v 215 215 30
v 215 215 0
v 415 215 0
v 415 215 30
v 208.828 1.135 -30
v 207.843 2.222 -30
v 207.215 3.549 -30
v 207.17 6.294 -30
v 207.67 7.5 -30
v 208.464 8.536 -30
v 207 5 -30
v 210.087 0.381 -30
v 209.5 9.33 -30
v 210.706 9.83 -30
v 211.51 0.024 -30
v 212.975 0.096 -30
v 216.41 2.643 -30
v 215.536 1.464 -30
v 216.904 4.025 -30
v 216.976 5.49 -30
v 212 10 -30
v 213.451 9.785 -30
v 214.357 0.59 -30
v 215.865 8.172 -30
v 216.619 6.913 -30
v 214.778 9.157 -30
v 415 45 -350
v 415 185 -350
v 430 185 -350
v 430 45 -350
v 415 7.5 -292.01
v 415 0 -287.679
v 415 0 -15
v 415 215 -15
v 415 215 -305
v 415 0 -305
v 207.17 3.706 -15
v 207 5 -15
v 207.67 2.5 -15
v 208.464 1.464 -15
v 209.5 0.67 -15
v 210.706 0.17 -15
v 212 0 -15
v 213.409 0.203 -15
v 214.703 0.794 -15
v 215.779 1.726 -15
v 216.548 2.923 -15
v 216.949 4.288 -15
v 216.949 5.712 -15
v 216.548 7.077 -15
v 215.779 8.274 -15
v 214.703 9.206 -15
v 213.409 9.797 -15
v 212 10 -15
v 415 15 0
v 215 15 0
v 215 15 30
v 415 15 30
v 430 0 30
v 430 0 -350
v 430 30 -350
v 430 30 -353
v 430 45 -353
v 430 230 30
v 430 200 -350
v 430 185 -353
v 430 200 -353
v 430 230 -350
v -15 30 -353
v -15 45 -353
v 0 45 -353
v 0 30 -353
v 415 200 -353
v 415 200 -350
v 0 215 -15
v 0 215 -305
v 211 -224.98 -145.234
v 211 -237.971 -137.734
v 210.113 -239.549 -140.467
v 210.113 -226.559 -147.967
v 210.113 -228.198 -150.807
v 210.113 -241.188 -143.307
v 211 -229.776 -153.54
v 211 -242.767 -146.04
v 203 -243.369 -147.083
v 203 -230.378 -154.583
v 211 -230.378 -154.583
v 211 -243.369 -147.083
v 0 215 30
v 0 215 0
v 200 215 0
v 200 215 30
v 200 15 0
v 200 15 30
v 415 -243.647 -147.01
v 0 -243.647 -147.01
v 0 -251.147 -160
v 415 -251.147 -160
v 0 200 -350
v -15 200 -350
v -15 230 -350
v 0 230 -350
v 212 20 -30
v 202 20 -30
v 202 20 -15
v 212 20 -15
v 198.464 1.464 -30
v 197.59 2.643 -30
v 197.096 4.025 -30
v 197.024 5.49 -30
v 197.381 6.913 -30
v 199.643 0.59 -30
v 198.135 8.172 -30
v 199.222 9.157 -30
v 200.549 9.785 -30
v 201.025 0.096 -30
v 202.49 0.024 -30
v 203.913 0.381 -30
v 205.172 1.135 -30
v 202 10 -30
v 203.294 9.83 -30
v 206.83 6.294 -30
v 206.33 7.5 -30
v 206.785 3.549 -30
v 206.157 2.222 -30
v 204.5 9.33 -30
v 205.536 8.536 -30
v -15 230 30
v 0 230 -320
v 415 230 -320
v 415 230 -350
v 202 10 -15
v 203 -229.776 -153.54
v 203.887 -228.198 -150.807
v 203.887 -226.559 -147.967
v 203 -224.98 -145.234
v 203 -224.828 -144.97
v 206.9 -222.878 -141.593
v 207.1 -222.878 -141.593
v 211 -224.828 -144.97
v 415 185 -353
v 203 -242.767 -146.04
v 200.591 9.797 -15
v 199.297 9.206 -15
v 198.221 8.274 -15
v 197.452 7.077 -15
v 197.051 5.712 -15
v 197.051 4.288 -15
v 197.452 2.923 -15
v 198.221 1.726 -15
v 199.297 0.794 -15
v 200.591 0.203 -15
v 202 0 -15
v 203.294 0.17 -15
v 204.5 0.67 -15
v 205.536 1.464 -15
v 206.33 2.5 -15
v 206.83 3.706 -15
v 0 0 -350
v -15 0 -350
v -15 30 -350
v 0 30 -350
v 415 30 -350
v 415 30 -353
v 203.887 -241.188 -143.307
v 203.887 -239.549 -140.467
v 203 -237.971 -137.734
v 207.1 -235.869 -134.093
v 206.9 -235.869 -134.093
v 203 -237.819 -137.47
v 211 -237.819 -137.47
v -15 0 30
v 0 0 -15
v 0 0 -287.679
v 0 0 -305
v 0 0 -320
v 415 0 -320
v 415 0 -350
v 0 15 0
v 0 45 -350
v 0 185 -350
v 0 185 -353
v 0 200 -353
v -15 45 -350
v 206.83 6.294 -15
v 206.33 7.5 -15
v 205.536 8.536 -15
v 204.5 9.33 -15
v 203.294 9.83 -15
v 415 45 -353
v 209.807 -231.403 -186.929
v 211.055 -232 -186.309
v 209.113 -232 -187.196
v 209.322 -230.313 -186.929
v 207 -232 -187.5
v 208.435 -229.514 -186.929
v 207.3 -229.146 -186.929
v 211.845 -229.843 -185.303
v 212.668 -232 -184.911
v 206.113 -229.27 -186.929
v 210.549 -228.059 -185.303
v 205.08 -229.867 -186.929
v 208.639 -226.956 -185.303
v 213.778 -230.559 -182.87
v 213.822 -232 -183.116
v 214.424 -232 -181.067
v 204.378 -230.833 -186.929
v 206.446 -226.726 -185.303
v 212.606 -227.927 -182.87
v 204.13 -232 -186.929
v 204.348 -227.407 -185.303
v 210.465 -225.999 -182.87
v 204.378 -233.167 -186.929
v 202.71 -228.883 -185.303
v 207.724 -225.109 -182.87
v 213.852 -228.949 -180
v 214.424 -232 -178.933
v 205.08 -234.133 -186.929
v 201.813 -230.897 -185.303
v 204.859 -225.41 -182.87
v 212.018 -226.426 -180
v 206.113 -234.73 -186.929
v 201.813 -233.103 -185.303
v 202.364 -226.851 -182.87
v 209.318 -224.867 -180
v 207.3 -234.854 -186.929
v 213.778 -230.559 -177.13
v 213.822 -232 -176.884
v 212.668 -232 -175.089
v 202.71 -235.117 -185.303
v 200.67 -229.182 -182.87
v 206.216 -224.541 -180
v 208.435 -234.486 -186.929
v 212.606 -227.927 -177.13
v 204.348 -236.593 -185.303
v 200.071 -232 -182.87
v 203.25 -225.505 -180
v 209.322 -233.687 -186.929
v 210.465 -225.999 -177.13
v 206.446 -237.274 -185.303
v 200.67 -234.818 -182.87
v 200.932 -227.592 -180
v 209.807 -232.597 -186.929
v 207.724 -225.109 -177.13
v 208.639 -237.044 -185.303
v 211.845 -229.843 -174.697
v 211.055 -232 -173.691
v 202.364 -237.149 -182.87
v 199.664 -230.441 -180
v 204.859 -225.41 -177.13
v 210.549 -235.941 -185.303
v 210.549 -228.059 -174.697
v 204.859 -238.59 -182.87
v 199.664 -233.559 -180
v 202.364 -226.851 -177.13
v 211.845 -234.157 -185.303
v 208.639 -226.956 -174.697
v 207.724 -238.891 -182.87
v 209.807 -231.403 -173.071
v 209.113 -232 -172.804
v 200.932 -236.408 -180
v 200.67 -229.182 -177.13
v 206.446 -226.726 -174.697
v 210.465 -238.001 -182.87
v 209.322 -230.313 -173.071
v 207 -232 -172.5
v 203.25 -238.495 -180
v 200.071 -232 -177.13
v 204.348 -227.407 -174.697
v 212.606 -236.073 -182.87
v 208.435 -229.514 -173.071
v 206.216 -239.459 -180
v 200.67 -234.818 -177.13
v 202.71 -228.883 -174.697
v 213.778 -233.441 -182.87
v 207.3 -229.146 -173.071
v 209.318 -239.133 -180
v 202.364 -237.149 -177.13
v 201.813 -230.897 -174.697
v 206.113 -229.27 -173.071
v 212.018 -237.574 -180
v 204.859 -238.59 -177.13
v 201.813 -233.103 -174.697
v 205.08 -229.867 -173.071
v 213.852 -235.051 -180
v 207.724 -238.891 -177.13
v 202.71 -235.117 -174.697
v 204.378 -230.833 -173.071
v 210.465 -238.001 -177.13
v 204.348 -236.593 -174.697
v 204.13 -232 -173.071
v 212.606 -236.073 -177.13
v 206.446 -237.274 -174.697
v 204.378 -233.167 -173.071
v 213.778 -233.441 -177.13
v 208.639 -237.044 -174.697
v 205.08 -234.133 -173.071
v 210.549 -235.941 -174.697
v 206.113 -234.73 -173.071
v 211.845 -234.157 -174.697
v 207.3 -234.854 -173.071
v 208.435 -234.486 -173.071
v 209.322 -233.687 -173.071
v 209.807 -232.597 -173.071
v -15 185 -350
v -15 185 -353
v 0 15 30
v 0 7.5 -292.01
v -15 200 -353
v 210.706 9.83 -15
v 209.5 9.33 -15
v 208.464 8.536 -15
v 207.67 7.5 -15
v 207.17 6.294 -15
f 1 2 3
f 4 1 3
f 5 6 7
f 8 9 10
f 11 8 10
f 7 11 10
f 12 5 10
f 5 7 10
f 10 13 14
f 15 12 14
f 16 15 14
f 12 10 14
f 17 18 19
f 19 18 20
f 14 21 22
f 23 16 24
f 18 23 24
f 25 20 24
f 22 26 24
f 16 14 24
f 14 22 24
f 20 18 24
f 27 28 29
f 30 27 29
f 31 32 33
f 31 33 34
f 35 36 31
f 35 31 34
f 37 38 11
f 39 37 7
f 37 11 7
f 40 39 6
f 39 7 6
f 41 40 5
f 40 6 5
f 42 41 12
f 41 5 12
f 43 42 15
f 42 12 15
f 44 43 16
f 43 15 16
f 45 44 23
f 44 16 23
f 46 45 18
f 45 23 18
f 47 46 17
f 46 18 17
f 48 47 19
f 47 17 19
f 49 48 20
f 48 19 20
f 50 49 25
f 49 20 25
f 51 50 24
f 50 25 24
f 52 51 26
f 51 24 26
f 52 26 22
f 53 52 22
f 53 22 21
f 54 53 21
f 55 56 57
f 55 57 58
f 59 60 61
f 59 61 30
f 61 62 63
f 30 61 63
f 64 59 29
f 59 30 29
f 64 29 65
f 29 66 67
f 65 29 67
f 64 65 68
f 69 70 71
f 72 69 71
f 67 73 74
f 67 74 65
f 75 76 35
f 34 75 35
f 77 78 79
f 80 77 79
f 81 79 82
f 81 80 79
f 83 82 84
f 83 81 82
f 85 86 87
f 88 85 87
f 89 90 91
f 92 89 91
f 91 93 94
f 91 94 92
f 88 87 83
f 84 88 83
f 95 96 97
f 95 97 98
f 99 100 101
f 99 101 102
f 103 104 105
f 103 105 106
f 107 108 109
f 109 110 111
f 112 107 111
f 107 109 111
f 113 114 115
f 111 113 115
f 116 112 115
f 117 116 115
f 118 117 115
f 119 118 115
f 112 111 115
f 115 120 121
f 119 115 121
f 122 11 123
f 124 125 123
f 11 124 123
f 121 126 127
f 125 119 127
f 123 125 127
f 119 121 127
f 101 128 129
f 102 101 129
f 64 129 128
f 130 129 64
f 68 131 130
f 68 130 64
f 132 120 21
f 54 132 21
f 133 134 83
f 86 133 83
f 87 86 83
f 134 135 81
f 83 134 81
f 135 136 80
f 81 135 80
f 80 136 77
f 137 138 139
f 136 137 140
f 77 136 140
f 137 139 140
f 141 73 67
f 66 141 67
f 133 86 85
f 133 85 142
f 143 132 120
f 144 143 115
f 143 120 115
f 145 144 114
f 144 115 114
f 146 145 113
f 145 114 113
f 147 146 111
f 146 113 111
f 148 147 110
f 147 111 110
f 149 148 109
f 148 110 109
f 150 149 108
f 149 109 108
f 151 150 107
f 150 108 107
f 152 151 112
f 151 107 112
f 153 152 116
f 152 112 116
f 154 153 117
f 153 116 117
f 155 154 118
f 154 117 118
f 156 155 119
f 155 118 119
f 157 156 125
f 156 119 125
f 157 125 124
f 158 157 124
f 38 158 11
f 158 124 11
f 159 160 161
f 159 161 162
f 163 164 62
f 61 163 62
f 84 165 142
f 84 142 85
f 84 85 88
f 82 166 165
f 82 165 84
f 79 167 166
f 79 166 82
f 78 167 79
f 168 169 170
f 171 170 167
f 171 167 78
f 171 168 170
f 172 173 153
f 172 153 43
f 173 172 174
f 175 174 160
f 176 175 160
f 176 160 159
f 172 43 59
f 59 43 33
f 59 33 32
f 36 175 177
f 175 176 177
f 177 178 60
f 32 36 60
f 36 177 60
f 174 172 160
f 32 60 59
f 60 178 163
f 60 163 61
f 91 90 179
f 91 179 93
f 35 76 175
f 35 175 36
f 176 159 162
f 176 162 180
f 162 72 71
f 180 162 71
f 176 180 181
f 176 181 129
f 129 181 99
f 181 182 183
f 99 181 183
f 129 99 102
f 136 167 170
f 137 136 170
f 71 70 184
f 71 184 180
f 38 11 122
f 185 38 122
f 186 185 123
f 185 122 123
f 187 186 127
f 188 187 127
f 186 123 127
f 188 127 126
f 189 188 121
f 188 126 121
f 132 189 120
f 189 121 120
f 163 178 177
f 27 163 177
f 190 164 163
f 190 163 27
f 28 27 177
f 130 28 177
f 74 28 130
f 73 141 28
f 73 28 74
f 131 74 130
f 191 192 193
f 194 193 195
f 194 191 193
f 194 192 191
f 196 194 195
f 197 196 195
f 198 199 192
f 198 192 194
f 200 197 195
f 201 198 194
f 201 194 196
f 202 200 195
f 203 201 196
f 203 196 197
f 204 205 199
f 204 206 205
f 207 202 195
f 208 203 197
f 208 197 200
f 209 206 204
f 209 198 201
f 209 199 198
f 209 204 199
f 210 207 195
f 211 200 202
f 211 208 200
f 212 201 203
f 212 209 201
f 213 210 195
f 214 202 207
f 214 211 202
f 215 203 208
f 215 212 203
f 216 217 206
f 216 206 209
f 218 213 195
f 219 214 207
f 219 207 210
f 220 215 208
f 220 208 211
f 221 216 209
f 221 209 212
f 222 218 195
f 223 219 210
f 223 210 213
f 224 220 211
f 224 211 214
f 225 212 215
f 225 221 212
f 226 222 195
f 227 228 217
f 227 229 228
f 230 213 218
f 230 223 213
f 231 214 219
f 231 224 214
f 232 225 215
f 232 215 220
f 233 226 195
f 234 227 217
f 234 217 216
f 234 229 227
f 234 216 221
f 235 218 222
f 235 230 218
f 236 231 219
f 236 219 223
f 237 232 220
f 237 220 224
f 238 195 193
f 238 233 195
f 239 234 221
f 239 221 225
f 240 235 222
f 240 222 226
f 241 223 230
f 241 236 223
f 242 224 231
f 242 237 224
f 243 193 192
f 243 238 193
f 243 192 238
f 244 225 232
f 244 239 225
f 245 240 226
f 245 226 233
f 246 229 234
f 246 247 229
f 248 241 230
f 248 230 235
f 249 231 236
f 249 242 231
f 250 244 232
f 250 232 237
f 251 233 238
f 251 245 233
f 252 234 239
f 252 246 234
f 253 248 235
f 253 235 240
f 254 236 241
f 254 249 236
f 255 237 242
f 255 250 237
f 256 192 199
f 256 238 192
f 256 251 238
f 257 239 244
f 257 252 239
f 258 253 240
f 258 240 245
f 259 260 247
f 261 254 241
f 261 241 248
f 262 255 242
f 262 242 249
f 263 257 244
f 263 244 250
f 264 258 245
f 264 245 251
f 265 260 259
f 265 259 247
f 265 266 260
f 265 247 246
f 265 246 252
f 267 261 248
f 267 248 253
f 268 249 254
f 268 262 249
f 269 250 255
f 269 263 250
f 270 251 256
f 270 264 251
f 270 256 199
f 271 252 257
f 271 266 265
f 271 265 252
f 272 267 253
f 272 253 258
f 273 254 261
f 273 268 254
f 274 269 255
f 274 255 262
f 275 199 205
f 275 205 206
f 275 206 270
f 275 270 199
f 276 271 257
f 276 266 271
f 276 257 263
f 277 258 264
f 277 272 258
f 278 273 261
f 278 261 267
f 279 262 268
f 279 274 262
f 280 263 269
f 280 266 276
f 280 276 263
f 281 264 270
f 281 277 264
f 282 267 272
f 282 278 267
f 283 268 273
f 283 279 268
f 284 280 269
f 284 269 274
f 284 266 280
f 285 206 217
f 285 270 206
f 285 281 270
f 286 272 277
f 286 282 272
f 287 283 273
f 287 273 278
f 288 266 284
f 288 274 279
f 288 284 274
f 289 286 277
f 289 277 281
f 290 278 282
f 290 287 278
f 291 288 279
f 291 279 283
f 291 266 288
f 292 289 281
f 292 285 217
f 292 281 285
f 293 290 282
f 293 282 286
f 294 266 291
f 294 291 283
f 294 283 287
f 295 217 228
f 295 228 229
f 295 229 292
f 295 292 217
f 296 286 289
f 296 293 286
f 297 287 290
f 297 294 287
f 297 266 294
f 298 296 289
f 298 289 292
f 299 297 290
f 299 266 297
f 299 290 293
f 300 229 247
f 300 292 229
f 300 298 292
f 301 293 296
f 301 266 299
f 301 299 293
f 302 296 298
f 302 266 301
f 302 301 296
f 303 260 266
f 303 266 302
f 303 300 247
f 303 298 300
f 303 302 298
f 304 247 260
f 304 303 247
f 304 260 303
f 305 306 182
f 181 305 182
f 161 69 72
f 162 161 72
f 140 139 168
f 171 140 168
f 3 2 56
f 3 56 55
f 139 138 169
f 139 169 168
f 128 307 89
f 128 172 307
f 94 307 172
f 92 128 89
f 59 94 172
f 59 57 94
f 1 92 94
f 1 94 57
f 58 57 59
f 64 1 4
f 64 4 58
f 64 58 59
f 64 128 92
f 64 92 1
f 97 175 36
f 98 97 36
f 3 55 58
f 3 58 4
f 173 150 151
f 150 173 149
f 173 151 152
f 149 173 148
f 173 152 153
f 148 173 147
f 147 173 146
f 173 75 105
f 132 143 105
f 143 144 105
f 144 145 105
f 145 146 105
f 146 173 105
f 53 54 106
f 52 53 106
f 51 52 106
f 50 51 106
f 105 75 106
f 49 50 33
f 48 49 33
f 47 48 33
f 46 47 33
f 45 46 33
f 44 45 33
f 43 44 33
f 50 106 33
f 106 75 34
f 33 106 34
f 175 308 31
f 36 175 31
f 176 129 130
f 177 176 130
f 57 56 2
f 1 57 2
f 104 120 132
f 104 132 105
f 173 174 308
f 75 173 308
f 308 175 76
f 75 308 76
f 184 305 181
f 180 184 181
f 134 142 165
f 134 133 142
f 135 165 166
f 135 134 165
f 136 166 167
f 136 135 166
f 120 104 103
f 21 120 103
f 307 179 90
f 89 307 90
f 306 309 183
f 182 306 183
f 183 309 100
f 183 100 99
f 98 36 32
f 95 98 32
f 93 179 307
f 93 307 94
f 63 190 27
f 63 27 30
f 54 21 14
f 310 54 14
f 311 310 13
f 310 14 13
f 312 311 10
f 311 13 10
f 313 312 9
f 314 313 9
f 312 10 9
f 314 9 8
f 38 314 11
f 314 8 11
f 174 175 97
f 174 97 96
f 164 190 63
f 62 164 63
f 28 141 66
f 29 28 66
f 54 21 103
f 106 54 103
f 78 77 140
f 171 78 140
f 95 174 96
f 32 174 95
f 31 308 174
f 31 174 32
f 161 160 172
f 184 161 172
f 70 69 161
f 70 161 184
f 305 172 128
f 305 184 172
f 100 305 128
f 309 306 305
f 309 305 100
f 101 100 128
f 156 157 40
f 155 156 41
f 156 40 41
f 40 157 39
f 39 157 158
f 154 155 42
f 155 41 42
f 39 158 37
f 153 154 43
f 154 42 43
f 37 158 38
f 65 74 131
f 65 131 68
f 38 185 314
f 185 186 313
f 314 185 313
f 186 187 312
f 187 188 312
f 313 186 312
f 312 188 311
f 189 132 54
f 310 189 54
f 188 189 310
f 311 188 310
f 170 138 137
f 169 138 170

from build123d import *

# Parameters (mm, degrees)
BOX001_W          = 15
BOX001_H          = 230
BOX001_DEPTH      = 380
BOX002_W          = 15
BOX002_H          = 230
BOX002_DEPTH      = 380
BOX003_W          = 415
BOX003_H          = 215
BOX003_DEPTH      = 15
BOX004_W          = 415
BOX004_H          = 15
BOX004_DEPTH      = 350
BOX005_W          = 15
BOX005_H          = 200
BOX005_DEPTH      = 30
BOX006_W          = 415
BOX006_H          = 215
BOX006_DEPTH      = 15
BOX007_W          = 15
BOX007_H          = 15
BOX007_DEPTH      = 3
BOX008_W          = 15
BOX008_H          = 15
BOX008_DEPTH      = 3
BOX009_W          = 15
BOX009_H          = 15
BOX009_DEPTH      = 3
BOX010_W          = 15
BOX010_H          = 15
BOX010_DEPTH      = 3
BOX011_W          = 415
BOX011_H          = 15
BOX011_DEPTH      = 290
BOX011_ROLL_ANGLE = 60
CYLINDER001_R     = 5
CYLINDER001_DEPTH = 15
BOX012_W          = 10
BOX012_H          = 10
BOX012_DEPTH      = 15
CYLINDER_R        = 5
CYLINDER_DEPTH    = 15
CYLINDER003_R     = 12
CYLINDER003_DEPTH = 15
CYLINDER002_R     = 12
CYLINDER002_DEPTH = 15
BOX013_W          = 8
BOX013_H          = 15
BOX013_DEPTH      = 15
CHAMFER_SIZE      = 3.9
CUT001_ROLL_ANGLE = 60
BOX_W             = 415
BOX_H             = 15
BOX_DEPTH         = 30


with BuildPart() as suportelateralverticalesquerdo:
    # Box001 → Box001 (new body)
    with BuildSketch(Plane(origin=(-15, 0, -350), x_dir=(1, 0, 0), z_dir=(0, 0, 1))):
        with Locations((7.5, 115)):
            Rectangle(BOX001_W, BOX001_H)
    extrude(amount=BOX001_DEPTH)


with BuildPart() as suportelateralverticaldireito:
    # Box002 → Box002 (new body)
    with BuildSketch(Plane(origin=(415, 0, -350), x_dir=(1, 0, 0), z_dir=(0, 0, 1))):
        with Locations((7.5, 115)):
            Rectangle(BOX002_W, BOX002_H)
    extrude(amount=BOX002_DEPTH)


with BuildPart() as tamposuperiorhorizontal:
    # Box003 → Box003 (new body)
    with BuildSketch(Plane.XY.offset(-15)):
        with Locations((207.5, 107.5)):
            Rectangle(BOX003_W, BOX003_H)
    extrude(amount=BOX003_DEPTH)


with BuildPart() as suportefundovertical:
    # Box004 → Box004 (new body)
    with BuildSketch(Plane(origin=(0, 215, -320), x_dir=(1, 0, 0), z_dir=(0, 0, 1))):
        with Locations((207.5, 7.5)):
            Rectangle(BOX004_W, BOX004_H)
    extrude(amount=BOX004_DEPTH)


with BuildPart() as suporteverticalmeio:
    # Box005 → Box005 (new body)
    with BuildSketch(Plane(origin=(200, 15, 0), x_dir=(1, 0, 0), z_dir=(0, 0, 1))):
        with Locations((7.5, 100)):
            Rectangle(BOX005_W, BOX005_H)
    extrude(amount=BOX005_DEPTH)


with BuildPart() as tampoinferiorhorizontal:
    # Box006 → Box006 (new body)
    with BuildSketch(Plane.XY.offset(-320)):
        with Locations((207.5, 107.5)):
            Rectangle(BOX006_W, BOX006_H)
    extrude(amount=BOX006_DEPTH)


with BuildPart() as cube:
    # Box007 → Box007 (new body)
    with BuildSketch(Plane(origin=(-15, 30, -353), x_dir=(1, 0, 0), z_dir=(0, 0, 1))):
        with Locations((7.5, 7.5)):
            Rectangle(BOX007_W, BOX007_H)
    extrude(amount=BOX007_DEPTH)


with BuildPart() as cube001:
    # Box008 → Box008 (new body)
    with BuildSketch(Plane(origin=(-15, 185, -353), x_dir=(1, 0, 0), z_dir=(0, 0, 1))):
        with Locations((7.5, 7.5)):
            Rectangle(BOX008_W, BOX008_H)
    extrude(amount=BOX008_DEPTH)


with BuildPart() as cube002:
    # Box009 → Box009 (new body)
    with BuildSketch(Plane(origin=(415, 30, -353), x_dir=(1, 0, 0), z_dir=(0, 0, 1))):
        with Locations((7.5, 7.5)):
            Rectangle(BOX009_W, BOX009_H)
    extrude(amount=BOX009_DEPTH)


with BuildPart() as cube003:
    # Box010 → Box010 (new body)
    with BuildSketch(Plane(origin=(415, 185, -353), x_dir=(1, 0, 0), z_dir=(0, 0, 1))):
        with Locations((7.5, 7.5)):
            Rectangle(BOX010_W, BOX010_H)
    extrude(amount=BOX010_DEPTH)


with BuildPart() as tampabasculante:
    # Box011 → Box011 (new body)
    with BuildSketch(Plane.XY):
        with Locations((207.5, 7.5)):
            Rectangle(BOX011_W, BOX011_H)
    extrude(amount=BOX011_DEPTH)


with BuildPart() as tampabasculante_1:
    # Box011 roll: moved
    add(tampabasculante.part.rotate(Axis((0, 0, 0), (1, 0, 0)), BOX011_ROLL_ANGLE))


with BuildPart() as tampabasculante_2:
    # Box011 placement: moved
    add(tampabasculante_1.part.moved(Location((0, 0, -305))))


with BuildPart() as puxador:
    # Sphere → Sphere (revolve)
    with BuildSketch(Plane(origin=(207, -232, -180), x_dir=(1, 0, 0), z_dir=(0, -1, 0))):
        with BuildLine():
            ThreePointArc((0, -7.5), (7.5, 0), (0, 7.5))
            Line((0, 7.5), (0, -7.5))
        make_face()
    revolve(axis=Axis((207, -232, -180), (0, 0, 1)))


with BuildPart() as cylinder001:
    # Cylinder001 → Cylinder001 (new body)
    with BuildSketch(Plane(origin=(-90, 0, 0), x_dir=(1, 0, 0), z_dir=(0, 0, 1))):
        Circle(CYLINDER001_R)
    extrude(amount=CYLINDER001_DEPTH)


with BuildPart() as cube004:
    # Box012 → Box012 (new body)
    with BuildSketch(Plane(origin=(-100, 5, 0), x_dir=(1, 0, 0), z_dir=(0, 0, 1))):
        with Locations((5, 5)):
            Rectangle(BOX012_W, BOX012_H)
    extrude(amount=BOX012_DEPTH)


with BuildPart() as fusion:
    # Cylinder → Cylinder (new body)
    with BuildSketch(Plane(origin=(-100, 0, 0), x_dir=(1, 0, 0), z_dir=(0, 0, 1))):
        Circle(CYLINDER_R)
    extrude(amount=CYLINDER_DEPTH)

    # Fusion: union Cylinder001, Cube004
    add(cylinder001.part)
    add(cube004.part)


with BuildPart() as fusion_1:
    # Fusion placement: moved
    add(fusion.part.moved(Location((302, 5, -30))))


with BuildPart() as cylinder003:
    # Cylinder003 → Cylinder003 (new body)
    with BuildSketch(Plane(origin=(182, -124, -70), x_dir=(1, 0, 0), z_dir=(0, 0, 1))):
        Circle(CYLINDER003_R)
    extrude(amount=CYLINDER003_DEPTH)


with BuildPart() as cylinder002:
    # Cylinder002 → Cylinder002 (new body)
    with BuildSketch(Plane(origin=(212, -124, -70), x_dir=(1, 0, 0), z_dir=(0, 0, 1))):
        Circle(CYLINDER002_R)
    extrude(amount=CYLINDER002_DEPTH)


with BuildPart() as cut001:
    # Box013 → Box013 (new body)
    with BuildSketch(Plane(origin=(193, -130, -70), x_dir=(1, 0, 0), z_dir=(0, 0, 1))):
        with Locations((4, 7.5)):
            Rectangle(BOX013_W, BOX013_H)
    extrude(amount=BOX013_DEPTH)

    # Chamfer
    chamfer_edges = [cut001.edges().sort_by_distance(p)[0] for p in [
        (193, -115, -62.5),
        (201, -115, -62.5),
    ]]
    chamfer(chamfer_edges, length=CHAMFER_SIZE)

    # Cut: cut Cylinder002
    add(cylinder002.part, mode=Mode.SUBTRACT)

    # Cut001: cut Cylinder003
    add(cylinder003.part, mode=Mode.SUBTRACT)


with BuildPart() as cut001_1:
    # Cut001 roll: moved
    add(cut001.part.rotate(Axis((0, 0, 0), (1, 0, 0)), CUT001_ROLL_ANGLE))


with BuildPart() as cut001_2:
    # Cut001 placement: moved
    add(cut001_1.part.moved(Location((10, -226, -7))))


with BuildPart() as fusion001:
    # Box → Box (new body)
    with BuildSketch(Plane.XY):
        with Locations((207.5, 7.5)):
            Rectangle(BOX_W, BOX_H)
    extrude(amount=BOX_DEPTH)

    # Fusion001: union SuporteLateralVerticalEsquerdo, SuporteLateralVerticalDireito, TampoSuperiorHorizontal, SuporteFundoVertical, SuporteVerticalMeio, TampoInferiorHorizontal, Cube, Cube001, Cube002, Cube003, TampaBasculante, Puxador, Fusion, Cut001
    add(suportelateralverticalesquerdo.part)
    add(suportelateralverticaldireito.part)
    add(tamposuperiorhorizontal.part)
    add(suportefundovertical.part)
    add(suporteverticalmeio.part)
    add(tampoinferiorhorizontal.part)
    add(cube.part)
    add(cube001.part)
    add(cube002.part)
    add(cube003.part)
    add(tampabasculante_2.part)
    add(puxador.part)
    add(fusion_1.part)
    add(cut001_2.part)


solid = fusion001.part
